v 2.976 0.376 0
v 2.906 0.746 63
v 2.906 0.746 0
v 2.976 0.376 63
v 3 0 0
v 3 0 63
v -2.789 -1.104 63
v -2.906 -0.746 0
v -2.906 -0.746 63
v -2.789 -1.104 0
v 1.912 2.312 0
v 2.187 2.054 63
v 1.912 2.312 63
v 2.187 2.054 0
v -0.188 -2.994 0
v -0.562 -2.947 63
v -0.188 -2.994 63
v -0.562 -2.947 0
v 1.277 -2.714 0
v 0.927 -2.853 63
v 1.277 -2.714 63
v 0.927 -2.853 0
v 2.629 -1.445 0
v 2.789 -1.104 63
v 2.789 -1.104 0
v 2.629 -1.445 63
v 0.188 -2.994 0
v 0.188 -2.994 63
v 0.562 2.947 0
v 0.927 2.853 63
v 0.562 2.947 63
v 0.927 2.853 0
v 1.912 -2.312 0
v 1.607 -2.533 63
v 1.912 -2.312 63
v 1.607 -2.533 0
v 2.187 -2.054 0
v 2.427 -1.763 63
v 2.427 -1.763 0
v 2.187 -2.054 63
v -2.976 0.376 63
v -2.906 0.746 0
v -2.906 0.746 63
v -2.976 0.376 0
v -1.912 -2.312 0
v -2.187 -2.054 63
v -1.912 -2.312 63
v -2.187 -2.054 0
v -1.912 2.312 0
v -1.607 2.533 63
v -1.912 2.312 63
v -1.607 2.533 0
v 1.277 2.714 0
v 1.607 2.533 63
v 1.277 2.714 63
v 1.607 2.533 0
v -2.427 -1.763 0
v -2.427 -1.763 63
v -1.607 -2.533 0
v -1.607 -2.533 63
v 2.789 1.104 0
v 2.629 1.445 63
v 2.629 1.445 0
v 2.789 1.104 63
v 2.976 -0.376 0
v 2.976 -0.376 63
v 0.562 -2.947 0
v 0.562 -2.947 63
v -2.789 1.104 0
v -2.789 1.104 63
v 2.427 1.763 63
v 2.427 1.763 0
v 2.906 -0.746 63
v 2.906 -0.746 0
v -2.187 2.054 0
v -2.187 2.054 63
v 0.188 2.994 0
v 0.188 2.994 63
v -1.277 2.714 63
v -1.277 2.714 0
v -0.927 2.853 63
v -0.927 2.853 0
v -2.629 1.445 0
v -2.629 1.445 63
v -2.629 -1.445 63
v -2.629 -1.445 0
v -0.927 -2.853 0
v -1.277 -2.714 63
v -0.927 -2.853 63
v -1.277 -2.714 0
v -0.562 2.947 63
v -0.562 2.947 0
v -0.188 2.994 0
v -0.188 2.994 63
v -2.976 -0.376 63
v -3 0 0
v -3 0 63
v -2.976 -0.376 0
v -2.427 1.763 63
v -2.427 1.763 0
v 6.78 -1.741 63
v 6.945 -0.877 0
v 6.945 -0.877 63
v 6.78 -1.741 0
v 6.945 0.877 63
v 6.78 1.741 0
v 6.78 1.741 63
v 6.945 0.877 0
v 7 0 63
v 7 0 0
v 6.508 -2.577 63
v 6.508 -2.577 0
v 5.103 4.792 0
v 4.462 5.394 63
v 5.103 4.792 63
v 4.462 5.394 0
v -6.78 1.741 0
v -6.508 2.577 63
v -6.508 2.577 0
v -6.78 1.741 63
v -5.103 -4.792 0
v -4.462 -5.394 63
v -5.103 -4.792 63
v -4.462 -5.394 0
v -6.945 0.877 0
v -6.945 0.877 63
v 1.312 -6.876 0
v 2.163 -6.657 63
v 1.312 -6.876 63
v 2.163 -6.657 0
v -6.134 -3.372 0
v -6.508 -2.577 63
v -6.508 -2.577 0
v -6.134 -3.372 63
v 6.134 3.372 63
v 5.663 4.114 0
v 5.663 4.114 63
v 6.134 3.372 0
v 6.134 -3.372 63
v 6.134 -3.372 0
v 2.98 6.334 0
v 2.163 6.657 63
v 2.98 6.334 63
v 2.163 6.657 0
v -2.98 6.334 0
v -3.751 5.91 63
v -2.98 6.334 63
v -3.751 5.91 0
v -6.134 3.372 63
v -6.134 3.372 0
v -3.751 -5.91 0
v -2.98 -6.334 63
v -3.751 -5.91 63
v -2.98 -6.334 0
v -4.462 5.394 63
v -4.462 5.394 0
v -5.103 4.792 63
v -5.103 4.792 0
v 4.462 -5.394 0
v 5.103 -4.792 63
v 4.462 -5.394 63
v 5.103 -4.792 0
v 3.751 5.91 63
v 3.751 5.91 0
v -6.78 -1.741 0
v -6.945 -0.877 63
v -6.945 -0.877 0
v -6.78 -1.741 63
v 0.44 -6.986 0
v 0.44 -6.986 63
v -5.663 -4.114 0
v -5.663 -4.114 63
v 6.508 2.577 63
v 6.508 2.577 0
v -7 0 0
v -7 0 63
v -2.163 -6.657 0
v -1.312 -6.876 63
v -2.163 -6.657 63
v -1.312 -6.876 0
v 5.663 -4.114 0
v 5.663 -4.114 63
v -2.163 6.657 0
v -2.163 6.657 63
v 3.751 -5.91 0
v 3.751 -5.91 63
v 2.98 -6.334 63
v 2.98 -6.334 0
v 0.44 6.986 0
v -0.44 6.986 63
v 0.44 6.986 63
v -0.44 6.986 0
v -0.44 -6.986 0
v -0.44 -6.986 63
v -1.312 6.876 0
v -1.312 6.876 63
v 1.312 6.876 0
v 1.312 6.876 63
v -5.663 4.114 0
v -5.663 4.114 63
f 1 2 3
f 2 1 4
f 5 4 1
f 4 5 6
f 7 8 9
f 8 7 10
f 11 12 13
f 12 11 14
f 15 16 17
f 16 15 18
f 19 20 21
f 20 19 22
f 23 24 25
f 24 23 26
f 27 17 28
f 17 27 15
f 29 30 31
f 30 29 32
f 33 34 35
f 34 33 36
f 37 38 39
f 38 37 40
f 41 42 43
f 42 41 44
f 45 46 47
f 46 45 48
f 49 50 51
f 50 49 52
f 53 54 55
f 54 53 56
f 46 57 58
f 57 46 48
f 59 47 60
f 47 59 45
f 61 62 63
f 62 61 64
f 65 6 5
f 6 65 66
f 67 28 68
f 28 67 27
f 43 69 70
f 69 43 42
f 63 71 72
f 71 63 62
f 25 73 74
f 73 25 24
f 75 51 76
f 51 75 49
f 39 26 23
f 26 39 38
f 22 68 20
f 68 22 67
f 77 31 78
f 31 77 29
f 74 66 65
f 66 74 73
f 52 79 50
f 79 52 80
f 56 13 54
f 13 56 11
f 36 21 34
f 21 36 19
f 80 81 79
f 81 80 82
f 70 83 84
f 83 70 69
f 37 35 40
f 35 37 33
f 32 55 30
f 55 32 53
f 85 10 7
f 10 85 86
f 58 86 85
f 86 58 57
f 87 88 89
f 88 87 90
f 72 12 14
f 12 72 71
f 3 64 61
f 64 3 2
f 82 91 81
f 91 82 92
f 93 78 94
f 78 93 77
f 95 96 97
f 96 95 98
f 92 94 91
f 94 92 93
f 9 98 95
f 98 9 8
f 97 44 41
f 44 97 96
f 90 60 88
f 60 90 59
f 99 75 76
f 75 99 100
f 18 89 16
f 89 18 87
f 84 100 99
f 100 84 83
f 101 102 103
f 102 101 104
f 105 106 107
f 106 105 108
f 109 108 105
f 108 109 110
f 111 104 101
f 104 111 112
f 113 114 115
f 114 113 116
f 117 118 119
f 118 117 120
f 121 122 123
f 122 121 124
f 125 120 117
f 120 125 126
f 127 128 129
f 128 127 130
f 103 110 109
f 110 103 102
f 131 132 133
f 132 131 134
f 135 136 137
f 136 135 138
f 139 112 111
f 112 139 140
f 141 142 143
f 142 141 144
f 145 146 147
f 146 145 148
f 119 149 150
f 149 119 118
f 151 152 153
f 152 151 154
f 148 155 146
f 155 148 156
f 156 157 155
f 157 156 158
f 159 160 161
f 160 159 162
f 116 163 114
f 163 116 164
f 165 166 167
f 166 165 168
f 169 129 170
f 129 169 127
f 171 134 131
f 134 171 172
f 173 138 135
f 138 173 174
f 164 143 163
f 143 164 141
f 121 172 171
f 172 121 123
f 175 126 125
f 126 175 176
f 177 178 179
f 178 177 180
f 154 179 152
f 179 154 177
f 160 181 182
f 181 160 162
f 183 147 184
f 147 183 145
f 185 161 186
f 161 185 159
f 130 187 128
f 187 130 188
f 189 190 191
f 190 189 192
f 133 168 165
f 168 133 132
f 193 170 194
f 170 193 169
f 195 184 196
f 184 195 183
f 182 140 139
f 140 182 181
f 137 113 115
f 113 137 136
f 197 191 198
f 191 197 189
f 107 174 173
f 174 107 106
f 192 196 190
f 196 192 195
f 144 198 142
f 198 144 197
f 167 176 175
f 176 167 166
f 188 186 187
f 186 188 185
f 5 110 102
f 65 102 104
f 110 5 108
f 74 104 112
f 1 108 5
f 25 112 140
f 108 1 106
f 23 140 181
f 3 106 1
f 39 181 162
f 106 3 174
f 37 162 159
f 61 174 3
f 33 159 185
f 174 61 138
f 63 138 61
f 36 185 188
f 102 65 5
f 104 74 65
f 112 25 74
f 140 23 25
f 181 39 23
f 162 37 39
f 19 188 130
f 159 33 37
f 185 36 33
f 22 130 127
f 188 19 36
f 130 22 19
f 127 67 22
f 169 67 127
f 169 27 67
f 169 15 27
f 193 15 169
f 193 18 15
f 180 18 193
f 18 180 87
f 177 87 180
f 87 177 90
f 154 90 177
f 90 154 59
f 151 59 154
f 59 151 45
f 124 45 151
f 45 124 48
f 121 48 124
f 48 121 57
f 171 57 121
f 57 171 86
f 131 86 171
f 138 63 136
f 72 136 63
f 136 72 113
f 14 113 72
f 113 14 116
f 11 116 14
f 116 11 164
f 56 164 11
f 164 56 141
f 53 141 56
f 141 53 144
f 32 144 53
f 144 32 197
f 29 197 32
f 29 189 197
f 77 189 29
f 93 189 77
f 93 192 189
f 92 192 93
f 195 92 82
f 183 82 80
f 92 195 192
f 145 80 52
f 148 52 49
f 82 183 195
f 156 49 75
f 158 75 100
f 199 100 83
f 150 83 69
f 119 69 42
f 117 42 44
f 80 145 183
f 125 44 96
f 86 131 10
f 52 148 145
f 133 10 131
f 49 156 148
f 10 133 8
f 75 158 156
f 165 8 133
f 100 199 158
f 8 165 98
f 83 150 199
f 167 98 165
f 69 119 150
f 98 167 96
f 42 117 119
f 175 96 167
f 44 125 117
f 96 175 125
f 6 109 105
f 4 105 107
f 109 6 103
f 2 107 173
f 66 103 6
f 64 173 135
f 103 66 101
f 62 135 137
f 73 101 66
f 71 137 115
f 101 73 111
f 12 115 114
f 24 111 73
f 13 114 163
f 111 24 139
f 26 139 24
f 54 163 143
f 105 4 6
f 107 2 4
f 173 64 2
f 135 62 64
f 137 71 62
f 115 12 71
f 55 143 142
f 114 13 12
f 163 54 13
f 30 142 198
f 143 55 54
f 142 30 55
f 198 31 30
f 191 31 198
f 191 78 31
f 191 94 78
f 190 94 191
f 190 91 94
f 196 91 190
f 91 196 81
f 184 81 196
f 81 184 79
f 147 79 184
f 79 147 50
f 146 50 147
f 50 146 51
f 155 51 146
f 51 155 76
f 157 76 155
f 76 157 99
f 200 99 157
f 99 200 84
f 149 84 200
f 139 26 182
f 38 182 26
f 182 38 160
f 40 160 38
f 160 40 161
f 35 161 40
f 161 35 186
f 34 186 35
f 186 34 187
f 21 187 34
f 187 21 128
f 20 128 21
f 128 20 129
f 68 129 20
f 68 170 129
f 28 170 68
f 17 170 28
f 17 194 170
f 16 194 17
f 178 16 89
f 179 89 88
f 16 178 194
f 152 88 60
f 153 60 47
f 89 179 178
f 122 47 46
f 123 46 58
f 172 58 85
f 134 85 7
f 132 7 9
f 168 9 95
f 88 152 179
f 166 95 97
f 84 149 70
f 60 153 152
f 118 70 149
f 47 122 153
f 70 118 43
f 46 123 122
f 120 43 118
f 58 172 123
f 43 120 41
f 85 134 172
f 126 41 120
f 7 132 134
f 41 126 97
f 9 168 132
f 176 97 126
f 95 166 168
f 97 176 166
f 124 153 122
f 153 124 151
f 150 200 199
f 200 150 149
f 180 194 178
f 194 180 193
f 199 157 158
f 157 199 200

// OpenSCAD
$fn = 50;

difference() {
	union() {
		cylinder(h = 63, r = 7.0);
	}
	union() {
		translate(v = [0, 0, -100]) {
			cylinder(h = 200, r = 3.0);
		}
		translate(v = [0, 0, -100]) {
			cylinder(h = 200, r = 1.5);
		}
	}
}
